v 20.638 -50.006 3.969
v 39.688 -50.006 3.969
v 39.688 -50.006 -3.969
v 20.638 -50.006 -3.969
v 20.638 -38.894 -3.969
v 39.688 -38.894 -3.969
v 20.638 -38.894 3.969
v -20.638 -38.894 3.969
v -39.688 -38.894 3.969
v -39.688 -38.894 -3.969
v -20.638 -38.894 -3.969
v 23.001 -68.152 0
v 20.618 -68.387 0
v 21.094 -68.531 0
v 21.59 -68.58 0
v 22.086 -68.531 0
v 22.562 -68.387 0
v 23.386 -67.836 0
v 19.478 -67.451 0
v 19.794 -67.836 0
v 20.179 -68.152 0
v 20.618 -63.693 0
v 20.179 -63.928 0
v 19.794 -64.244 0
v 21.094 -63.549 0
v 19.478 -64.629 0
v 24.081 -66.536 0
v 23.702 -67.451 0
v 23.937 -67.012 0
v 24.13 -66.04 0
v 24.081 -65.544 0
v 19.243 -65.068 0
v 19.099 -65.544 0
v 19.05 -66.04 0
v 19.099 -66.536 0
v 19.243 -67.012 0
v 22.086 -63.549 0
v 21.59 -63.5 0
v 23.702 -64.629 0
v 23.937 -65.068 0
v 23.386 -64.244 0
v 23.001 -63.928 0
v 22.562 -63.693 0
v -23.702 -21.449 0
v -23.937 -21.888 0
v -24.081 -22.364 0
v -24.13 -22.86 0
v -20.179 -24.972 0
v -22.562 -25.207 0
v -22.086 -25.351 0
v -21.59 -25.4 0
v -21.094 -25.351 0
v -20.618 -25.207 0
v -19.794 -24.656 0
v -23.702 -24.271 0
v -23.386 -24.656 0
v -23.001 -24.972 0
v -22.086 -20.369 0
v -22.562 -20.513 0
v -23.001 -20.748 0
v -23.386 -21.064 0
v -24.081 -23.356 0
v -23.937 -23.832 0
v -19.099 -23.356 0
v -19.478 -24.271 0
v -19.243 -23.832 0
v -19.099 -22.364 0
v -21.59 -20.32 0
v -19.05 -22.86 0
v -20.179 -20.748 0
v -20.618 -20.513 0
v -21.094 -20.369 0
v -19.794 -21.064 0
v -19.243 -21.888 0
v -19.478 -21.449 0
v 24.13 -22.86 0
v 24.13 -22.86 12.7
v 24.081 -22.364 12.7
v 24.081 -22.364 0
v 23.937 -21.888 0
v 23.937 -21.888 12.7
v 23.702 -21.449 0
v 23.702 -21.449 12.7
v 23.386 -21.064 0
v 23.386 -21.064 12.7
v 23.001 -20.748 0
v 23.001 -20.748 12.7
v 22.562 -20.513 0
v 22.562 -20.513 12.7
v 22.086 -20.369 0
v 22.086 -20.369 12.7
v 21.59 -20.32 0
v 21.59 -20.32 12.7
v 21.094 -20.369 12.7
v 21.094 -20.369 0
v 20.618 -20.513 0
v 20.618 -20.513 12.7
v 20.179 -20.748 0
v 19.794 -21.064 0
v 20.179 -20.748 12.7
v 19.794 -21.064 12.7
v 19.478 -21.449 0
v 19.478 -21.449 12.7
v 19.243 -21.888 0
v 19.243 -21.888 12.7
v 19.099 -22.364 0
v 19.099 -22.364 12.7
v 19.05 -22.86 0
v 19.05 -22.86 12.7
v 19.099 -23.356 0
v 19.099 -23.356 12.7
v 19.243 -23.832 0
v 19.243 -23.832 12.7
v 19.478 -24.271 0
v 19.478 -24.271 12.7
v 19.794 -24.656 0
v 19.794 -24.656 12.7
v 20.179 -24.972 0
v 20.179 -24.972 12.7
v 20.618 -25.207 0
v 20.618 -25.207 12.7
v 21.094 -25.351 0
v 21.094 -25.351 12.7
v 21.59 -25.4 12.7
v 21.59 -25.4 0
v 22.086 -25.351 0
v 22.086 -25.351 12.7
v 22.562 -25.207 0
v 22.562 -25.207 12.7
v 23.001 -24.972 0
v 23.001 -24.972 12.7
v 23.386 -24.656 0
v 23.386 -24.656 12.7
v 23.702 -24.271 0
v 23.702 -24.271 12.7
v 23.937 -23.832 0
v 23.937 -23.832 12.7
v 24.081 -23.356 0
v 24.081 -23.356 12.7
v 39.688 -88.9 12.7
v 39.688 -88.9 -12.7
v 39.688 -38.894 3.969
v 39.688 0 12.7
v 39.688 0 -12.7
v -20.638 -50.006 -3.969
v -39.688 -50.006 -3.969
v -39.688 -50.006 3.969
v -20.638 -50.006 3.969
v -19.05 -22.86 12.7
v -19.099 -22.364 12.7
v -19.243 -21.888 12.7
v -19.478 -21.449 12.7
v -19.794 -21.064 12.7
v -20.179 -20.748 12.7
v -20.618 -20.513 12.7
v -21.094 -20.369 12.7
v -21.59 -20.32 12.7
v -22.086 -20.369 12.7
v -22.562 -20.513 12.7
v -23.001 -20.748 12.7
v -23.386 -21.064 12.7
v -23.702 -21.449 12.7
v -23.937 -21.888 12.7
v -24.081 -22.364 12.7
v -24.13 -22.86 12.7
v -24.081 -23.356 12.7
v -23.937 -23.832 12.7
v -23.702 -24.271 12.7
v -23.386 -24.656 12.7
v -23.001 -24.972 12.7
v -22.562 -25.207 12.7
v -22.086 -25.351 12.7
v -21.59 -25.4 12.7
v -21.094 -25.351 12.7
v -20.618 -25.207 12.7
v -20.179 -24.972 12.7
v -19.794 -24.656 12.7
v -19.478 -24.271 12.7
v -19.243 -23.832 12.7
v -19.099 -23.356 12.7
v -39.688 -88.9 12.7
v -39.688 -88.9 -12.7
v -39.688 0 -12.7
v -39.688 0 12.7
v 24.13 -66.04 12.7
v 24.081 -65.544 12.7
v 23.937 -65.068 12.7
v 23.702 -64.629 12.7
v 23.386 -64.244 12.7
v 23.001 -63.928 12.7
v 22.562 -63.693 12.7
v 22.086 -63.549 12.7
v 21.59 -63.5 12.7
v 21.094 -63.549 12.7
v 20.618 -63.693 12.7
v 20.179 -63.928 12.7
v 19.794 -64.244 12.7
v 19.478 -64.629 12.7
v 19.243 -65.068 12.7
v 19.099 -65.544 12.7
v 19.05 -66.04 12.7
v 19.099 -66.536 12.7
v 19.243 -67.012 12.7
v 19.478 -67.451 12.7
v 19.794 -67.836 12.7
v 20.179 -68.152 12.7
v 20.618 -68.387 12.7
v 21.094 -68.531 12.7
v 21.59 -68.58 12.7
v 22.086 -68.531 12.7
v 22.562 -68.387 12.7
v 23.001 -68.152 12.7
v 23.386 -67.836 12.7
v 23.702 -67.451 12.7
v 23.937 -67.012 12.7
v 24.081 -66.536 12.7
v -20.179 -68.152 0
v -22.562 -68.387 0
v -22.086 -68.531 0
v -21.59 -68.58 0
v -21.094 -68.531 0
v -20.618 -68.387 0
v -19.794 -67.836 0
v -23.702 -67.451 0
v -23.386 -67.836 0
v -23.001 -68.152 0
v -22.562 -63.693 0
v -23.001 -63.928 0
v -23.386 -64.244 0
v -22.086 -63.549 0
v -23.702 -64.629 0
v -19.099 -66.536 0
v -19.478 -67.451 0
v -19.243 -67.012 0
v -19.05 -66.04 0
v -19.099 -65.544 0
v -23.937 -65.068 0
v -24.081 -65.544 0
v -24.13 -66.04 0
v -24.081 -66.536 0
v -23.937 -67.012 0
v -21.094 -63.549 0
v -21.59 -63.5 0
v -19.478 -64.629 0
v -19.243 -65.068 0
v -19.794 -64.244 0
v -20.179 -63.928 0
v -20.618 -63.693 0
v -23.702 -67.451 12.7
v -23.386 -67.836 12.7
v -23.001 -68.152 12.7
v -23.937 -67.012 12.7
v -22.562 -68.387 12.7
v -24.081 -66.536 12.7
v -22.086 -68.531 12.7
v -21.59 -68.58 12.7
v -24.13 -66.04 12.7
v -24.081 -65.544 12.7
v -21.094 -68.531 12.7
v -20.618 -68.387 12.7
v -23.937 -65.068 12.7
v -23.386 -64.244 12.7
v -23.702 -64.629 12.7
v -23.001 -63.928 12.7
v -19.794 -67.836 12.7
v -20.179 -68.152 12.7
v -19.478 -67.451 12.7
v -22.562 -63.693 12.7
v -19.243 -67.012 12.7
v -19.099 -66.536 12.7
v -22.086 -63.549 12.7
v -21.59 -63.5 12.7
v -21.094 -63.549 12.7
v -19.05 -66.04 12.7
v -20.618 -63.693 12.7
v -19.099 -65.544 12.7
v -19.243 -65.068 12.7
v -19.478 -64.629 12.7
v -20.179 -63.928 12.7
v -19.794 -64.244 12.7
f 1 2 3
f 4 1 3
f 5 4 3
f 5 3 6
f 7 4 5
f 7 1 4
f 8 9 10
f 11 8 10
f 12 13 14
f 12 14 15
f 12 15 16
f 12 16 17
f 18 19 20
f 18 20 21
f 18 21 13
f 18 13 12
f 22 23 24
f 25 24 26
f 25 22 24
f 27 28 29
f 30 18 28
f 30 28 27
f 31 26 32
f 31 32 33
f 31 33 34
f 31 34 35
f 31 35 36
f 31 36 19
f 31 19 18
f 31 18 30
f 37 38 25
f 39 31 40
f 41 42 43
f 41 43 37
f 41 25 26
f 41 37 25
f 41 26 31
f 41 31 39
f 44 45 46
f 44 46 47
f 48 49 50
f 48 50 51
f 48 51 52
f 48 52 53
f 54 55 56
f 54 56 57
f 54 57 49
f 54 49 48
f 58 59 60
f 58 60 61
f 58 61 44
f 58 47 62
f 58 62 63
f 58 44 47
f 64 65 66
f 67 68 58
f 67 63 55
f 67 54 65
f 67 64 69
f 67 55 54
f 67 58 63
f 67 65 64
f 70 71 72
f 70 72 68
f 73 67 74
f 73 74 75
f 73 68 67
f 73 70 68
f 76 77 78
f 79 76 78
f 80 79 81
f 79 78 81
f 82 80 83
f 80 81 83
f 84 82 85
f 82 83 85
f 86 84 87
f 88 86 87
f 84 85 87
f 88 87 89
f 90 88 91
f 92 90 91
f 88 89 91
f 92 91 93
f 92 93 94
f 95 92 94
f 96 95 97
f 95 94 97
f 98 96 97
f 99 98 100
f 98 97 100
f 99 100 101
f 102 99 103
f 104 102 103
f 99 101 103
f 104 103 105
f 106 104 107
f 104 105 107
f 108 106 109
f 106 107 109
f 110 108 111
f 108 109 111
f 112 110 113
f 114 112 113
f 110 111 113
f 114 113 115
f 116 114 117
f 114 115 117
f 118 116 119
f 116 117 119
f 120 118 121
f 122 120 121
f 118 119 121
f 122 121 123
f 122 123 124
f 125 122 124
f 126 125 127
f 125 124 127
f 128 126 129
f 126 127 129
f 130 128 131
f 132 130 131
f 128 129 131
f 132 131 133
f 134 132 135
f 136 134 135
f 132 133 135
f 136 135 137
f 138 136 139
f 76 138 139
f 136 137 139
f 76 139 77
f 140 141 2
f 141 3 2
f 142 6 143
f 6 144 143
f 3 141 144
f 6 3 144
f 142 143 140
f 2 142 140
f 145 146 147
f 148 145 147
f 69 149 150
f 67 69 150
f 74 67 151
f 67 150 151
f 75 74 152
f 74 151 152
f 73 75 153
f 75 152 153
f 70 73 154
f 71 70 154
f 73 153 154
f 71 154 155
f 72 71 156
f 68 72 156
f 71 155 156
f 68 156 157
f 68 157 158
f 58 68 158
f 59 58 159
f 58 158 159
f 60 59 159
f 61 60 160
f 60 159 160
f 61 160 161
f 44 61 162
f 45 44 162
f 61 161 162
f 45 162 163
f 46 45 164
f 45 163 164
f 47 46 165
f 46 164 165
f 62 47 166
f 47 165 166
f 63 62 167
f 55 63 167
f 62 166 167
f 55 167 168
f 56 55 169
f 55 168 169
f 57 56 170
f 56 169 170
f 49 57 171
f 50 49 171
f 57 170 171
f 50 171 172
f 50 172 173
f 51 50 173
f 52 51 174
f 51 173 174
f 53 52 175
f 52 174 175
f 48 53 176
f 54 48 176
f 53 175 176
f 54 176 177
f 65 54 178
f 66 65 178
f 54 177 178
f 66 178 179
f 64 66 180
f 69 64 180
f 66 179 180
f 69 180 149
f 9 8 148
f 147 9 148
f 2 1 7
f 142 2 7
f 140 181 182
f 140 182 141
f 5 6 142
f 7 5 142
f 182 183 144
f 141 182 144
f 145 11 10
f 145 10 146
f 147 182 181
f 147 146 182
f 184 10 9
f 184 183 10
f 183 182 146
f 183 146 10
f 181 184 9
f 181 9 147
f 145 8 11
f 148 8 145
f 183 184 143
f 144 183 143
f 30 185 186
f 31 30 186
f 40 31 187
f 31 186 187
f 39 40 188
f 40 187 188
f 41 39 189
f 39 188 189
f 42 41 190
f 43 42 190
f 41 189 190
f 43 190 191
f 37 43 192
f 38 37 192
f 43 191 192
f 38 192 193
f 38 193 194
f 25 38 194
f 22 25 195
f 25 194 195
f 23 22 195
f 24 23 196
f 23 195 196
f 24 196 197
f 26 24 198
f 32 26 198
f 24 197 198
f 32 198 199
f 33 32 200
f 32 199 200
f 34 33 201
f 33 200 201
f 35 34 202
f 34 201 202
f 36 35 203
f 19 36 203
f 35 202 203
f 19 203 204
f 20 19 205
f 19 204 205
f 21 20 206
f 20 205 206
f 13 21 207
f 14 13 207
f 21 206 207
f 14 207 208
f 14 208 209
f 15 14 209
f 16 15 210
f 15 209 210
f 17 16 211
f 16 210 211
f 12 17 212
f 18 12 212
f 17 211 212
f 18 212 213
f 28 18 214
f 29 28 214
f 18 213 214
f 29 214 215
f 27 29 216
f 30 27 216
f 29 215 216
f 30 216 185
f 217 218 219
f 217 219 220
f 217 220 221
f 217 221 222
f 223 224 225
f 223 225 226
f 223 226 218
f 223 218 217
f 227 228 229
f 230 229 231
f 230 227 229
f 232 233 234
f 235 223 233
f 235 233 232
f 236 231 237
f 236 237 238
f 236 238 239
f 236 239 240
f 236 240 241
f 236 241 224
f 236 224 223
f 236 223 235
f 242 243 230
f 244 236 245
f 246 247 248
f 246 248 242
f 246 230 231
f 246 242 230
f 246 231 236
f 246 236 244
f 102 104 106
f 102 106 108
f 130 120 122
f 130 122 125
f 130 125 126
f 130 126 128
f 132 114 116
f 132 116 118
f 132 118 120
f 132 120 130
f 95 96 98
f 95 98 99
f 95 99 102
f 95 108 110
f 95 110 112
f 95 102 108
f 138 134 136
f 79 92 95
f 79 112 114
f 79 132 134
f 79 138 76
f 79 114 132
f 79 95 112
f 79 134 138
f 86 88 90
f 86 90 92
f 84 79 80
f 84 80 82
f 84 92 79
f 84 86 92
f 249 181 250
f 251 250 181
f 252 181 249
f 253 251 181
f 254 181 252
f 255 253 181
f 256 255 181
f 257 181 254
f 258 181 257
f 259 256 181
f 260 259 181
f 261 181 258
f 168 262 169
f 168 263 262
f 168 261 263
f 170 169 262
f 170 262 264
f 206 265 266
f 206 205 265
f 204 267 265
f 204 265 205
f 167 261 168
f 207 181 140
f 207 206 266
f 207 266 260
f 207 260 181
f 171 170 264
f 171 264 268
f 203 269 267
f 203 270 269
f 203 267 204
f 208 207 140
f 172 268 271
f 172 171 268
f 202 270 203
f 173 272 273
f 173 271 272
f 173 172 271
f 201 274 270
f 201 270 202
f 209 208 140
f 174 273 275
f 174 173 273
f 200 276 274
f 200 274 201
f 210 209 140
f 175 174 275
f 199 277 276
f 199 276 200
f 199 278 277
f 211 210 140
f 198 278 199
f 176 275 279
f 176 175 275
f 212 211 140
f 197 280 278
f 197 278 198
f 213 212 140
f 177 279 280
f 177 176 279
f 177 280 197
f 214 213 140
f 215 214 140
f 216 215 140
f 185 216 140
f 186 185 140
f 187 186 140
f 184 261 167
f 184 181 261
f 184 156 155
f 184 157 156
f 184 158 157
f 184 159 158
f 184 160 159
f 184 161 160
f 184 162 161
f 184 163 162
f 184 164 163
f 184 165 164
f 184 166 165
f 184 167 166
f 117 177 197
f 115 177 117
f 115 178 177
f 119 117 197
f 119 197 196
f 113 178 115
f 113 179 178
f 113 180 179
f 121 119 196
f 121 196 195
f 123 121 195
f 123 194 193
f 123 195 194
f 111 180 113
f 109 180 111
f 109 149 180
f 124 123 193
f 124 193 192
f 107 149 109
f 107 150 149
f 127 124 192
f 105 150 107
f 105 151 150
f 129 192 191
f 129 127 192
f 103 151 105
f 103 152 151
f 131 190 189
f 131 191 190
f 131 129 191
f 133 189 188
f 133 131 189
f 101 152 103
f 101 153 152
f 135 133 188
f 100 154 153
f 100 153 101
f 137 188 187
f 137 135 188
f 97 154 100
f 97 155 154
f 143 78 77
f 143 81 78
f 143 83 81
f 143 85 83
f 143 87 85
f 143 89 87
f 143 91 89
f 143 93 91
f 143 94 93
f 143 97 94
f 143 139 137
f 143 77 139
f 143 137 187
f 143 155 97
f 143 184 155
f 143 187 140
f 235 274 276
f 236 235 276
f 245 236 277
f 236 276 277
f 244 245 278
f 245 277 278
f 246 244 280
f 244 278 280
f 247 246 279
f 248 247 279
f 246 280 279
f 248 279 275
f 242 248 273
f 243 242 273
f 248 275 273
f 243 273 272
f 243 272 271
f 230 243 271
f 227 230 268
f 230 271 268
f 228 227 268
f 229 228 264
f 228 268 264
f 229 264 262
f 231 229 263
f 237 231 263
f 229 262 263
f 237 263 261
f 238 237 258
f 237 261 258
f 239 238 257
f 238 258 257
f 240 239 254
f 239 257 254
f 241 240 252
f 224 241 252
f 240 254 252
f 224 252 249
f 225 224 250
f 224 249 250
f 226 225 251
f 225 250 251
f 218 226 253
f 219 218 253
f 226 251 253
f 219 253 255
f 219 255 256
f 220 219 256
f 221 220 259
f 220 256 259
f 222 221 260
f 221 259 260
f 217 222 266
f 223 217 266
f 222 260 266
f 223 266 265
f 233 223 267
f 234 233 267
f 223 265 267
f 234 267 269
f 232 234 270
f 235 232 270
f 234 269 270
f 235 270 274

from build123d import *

# Parameters (mm, degrees)
F0_W     = 79.375
F0_H     = 25.4
F1_DEPTH = 88.9
F2_W     = 11.1125
F2_H     = 3.96875
F3_DEPTH = 19.05
F4_W     = 11.1125
F4_H     = 3.96875
F5_DEPTH = 19.05
F6_R     = 2.54
F7_DEPTH = 12.7


with BuildPart() as f1:
    # F0 (on Front) → F1 (new body)
    with BuildSketch(Plane.XZ):
        Rectangle(F0_W, F0_H)
    extrude(amount=F1_DEPTH)

    # F2 (on face) → F3 (cut)
    with BuildSketch(Plane.YZ.offset(39.6875)):
        with Locations((-44.45, -1.984375)):
            Rectangle(F2_W, F2_H)
        with Locations((-44.45, 1.984375)):
            Rectangle(F2_W, F2_H)
    extrude(amount=-F3_DEPTH, mode=Mode.SUBTRACT)

    # F4 (on face) → F5 (cut)
    with BuildSketch(Plane(origin=(-39.6875, 0, 0), x_dir=(0, -1, 0), z_dir=(-1, 0, 0))):
        with Locations((44.45, 1.984375)):
            Rectangle(F4_W, F4_H)
        with Locations((44.45, -1.984375)):
            Rectangle(F4_W, F4_H)
    extrude(amount=-F5_DEPTH, mode=Mode.SUBTRACT)

    # F6 (on face) → F7 (cut)
    with BuildSketch(Plane.XY.offset(12.7)):
        with Locations((-21.59, -22.86)):
            Circle(F6_R)
        with Locations((21.59, -22.86)):
            Circle(F6_R)
        with Locations((21.59, -66.04)):
            Circle(F6_R)
        with Locations((-21.59, -66.04)):
            Circle(F6_R)
    extrude(amount=-F7_DEPTH, mode=Mode.SUBTRACT)


solid = f1.part
